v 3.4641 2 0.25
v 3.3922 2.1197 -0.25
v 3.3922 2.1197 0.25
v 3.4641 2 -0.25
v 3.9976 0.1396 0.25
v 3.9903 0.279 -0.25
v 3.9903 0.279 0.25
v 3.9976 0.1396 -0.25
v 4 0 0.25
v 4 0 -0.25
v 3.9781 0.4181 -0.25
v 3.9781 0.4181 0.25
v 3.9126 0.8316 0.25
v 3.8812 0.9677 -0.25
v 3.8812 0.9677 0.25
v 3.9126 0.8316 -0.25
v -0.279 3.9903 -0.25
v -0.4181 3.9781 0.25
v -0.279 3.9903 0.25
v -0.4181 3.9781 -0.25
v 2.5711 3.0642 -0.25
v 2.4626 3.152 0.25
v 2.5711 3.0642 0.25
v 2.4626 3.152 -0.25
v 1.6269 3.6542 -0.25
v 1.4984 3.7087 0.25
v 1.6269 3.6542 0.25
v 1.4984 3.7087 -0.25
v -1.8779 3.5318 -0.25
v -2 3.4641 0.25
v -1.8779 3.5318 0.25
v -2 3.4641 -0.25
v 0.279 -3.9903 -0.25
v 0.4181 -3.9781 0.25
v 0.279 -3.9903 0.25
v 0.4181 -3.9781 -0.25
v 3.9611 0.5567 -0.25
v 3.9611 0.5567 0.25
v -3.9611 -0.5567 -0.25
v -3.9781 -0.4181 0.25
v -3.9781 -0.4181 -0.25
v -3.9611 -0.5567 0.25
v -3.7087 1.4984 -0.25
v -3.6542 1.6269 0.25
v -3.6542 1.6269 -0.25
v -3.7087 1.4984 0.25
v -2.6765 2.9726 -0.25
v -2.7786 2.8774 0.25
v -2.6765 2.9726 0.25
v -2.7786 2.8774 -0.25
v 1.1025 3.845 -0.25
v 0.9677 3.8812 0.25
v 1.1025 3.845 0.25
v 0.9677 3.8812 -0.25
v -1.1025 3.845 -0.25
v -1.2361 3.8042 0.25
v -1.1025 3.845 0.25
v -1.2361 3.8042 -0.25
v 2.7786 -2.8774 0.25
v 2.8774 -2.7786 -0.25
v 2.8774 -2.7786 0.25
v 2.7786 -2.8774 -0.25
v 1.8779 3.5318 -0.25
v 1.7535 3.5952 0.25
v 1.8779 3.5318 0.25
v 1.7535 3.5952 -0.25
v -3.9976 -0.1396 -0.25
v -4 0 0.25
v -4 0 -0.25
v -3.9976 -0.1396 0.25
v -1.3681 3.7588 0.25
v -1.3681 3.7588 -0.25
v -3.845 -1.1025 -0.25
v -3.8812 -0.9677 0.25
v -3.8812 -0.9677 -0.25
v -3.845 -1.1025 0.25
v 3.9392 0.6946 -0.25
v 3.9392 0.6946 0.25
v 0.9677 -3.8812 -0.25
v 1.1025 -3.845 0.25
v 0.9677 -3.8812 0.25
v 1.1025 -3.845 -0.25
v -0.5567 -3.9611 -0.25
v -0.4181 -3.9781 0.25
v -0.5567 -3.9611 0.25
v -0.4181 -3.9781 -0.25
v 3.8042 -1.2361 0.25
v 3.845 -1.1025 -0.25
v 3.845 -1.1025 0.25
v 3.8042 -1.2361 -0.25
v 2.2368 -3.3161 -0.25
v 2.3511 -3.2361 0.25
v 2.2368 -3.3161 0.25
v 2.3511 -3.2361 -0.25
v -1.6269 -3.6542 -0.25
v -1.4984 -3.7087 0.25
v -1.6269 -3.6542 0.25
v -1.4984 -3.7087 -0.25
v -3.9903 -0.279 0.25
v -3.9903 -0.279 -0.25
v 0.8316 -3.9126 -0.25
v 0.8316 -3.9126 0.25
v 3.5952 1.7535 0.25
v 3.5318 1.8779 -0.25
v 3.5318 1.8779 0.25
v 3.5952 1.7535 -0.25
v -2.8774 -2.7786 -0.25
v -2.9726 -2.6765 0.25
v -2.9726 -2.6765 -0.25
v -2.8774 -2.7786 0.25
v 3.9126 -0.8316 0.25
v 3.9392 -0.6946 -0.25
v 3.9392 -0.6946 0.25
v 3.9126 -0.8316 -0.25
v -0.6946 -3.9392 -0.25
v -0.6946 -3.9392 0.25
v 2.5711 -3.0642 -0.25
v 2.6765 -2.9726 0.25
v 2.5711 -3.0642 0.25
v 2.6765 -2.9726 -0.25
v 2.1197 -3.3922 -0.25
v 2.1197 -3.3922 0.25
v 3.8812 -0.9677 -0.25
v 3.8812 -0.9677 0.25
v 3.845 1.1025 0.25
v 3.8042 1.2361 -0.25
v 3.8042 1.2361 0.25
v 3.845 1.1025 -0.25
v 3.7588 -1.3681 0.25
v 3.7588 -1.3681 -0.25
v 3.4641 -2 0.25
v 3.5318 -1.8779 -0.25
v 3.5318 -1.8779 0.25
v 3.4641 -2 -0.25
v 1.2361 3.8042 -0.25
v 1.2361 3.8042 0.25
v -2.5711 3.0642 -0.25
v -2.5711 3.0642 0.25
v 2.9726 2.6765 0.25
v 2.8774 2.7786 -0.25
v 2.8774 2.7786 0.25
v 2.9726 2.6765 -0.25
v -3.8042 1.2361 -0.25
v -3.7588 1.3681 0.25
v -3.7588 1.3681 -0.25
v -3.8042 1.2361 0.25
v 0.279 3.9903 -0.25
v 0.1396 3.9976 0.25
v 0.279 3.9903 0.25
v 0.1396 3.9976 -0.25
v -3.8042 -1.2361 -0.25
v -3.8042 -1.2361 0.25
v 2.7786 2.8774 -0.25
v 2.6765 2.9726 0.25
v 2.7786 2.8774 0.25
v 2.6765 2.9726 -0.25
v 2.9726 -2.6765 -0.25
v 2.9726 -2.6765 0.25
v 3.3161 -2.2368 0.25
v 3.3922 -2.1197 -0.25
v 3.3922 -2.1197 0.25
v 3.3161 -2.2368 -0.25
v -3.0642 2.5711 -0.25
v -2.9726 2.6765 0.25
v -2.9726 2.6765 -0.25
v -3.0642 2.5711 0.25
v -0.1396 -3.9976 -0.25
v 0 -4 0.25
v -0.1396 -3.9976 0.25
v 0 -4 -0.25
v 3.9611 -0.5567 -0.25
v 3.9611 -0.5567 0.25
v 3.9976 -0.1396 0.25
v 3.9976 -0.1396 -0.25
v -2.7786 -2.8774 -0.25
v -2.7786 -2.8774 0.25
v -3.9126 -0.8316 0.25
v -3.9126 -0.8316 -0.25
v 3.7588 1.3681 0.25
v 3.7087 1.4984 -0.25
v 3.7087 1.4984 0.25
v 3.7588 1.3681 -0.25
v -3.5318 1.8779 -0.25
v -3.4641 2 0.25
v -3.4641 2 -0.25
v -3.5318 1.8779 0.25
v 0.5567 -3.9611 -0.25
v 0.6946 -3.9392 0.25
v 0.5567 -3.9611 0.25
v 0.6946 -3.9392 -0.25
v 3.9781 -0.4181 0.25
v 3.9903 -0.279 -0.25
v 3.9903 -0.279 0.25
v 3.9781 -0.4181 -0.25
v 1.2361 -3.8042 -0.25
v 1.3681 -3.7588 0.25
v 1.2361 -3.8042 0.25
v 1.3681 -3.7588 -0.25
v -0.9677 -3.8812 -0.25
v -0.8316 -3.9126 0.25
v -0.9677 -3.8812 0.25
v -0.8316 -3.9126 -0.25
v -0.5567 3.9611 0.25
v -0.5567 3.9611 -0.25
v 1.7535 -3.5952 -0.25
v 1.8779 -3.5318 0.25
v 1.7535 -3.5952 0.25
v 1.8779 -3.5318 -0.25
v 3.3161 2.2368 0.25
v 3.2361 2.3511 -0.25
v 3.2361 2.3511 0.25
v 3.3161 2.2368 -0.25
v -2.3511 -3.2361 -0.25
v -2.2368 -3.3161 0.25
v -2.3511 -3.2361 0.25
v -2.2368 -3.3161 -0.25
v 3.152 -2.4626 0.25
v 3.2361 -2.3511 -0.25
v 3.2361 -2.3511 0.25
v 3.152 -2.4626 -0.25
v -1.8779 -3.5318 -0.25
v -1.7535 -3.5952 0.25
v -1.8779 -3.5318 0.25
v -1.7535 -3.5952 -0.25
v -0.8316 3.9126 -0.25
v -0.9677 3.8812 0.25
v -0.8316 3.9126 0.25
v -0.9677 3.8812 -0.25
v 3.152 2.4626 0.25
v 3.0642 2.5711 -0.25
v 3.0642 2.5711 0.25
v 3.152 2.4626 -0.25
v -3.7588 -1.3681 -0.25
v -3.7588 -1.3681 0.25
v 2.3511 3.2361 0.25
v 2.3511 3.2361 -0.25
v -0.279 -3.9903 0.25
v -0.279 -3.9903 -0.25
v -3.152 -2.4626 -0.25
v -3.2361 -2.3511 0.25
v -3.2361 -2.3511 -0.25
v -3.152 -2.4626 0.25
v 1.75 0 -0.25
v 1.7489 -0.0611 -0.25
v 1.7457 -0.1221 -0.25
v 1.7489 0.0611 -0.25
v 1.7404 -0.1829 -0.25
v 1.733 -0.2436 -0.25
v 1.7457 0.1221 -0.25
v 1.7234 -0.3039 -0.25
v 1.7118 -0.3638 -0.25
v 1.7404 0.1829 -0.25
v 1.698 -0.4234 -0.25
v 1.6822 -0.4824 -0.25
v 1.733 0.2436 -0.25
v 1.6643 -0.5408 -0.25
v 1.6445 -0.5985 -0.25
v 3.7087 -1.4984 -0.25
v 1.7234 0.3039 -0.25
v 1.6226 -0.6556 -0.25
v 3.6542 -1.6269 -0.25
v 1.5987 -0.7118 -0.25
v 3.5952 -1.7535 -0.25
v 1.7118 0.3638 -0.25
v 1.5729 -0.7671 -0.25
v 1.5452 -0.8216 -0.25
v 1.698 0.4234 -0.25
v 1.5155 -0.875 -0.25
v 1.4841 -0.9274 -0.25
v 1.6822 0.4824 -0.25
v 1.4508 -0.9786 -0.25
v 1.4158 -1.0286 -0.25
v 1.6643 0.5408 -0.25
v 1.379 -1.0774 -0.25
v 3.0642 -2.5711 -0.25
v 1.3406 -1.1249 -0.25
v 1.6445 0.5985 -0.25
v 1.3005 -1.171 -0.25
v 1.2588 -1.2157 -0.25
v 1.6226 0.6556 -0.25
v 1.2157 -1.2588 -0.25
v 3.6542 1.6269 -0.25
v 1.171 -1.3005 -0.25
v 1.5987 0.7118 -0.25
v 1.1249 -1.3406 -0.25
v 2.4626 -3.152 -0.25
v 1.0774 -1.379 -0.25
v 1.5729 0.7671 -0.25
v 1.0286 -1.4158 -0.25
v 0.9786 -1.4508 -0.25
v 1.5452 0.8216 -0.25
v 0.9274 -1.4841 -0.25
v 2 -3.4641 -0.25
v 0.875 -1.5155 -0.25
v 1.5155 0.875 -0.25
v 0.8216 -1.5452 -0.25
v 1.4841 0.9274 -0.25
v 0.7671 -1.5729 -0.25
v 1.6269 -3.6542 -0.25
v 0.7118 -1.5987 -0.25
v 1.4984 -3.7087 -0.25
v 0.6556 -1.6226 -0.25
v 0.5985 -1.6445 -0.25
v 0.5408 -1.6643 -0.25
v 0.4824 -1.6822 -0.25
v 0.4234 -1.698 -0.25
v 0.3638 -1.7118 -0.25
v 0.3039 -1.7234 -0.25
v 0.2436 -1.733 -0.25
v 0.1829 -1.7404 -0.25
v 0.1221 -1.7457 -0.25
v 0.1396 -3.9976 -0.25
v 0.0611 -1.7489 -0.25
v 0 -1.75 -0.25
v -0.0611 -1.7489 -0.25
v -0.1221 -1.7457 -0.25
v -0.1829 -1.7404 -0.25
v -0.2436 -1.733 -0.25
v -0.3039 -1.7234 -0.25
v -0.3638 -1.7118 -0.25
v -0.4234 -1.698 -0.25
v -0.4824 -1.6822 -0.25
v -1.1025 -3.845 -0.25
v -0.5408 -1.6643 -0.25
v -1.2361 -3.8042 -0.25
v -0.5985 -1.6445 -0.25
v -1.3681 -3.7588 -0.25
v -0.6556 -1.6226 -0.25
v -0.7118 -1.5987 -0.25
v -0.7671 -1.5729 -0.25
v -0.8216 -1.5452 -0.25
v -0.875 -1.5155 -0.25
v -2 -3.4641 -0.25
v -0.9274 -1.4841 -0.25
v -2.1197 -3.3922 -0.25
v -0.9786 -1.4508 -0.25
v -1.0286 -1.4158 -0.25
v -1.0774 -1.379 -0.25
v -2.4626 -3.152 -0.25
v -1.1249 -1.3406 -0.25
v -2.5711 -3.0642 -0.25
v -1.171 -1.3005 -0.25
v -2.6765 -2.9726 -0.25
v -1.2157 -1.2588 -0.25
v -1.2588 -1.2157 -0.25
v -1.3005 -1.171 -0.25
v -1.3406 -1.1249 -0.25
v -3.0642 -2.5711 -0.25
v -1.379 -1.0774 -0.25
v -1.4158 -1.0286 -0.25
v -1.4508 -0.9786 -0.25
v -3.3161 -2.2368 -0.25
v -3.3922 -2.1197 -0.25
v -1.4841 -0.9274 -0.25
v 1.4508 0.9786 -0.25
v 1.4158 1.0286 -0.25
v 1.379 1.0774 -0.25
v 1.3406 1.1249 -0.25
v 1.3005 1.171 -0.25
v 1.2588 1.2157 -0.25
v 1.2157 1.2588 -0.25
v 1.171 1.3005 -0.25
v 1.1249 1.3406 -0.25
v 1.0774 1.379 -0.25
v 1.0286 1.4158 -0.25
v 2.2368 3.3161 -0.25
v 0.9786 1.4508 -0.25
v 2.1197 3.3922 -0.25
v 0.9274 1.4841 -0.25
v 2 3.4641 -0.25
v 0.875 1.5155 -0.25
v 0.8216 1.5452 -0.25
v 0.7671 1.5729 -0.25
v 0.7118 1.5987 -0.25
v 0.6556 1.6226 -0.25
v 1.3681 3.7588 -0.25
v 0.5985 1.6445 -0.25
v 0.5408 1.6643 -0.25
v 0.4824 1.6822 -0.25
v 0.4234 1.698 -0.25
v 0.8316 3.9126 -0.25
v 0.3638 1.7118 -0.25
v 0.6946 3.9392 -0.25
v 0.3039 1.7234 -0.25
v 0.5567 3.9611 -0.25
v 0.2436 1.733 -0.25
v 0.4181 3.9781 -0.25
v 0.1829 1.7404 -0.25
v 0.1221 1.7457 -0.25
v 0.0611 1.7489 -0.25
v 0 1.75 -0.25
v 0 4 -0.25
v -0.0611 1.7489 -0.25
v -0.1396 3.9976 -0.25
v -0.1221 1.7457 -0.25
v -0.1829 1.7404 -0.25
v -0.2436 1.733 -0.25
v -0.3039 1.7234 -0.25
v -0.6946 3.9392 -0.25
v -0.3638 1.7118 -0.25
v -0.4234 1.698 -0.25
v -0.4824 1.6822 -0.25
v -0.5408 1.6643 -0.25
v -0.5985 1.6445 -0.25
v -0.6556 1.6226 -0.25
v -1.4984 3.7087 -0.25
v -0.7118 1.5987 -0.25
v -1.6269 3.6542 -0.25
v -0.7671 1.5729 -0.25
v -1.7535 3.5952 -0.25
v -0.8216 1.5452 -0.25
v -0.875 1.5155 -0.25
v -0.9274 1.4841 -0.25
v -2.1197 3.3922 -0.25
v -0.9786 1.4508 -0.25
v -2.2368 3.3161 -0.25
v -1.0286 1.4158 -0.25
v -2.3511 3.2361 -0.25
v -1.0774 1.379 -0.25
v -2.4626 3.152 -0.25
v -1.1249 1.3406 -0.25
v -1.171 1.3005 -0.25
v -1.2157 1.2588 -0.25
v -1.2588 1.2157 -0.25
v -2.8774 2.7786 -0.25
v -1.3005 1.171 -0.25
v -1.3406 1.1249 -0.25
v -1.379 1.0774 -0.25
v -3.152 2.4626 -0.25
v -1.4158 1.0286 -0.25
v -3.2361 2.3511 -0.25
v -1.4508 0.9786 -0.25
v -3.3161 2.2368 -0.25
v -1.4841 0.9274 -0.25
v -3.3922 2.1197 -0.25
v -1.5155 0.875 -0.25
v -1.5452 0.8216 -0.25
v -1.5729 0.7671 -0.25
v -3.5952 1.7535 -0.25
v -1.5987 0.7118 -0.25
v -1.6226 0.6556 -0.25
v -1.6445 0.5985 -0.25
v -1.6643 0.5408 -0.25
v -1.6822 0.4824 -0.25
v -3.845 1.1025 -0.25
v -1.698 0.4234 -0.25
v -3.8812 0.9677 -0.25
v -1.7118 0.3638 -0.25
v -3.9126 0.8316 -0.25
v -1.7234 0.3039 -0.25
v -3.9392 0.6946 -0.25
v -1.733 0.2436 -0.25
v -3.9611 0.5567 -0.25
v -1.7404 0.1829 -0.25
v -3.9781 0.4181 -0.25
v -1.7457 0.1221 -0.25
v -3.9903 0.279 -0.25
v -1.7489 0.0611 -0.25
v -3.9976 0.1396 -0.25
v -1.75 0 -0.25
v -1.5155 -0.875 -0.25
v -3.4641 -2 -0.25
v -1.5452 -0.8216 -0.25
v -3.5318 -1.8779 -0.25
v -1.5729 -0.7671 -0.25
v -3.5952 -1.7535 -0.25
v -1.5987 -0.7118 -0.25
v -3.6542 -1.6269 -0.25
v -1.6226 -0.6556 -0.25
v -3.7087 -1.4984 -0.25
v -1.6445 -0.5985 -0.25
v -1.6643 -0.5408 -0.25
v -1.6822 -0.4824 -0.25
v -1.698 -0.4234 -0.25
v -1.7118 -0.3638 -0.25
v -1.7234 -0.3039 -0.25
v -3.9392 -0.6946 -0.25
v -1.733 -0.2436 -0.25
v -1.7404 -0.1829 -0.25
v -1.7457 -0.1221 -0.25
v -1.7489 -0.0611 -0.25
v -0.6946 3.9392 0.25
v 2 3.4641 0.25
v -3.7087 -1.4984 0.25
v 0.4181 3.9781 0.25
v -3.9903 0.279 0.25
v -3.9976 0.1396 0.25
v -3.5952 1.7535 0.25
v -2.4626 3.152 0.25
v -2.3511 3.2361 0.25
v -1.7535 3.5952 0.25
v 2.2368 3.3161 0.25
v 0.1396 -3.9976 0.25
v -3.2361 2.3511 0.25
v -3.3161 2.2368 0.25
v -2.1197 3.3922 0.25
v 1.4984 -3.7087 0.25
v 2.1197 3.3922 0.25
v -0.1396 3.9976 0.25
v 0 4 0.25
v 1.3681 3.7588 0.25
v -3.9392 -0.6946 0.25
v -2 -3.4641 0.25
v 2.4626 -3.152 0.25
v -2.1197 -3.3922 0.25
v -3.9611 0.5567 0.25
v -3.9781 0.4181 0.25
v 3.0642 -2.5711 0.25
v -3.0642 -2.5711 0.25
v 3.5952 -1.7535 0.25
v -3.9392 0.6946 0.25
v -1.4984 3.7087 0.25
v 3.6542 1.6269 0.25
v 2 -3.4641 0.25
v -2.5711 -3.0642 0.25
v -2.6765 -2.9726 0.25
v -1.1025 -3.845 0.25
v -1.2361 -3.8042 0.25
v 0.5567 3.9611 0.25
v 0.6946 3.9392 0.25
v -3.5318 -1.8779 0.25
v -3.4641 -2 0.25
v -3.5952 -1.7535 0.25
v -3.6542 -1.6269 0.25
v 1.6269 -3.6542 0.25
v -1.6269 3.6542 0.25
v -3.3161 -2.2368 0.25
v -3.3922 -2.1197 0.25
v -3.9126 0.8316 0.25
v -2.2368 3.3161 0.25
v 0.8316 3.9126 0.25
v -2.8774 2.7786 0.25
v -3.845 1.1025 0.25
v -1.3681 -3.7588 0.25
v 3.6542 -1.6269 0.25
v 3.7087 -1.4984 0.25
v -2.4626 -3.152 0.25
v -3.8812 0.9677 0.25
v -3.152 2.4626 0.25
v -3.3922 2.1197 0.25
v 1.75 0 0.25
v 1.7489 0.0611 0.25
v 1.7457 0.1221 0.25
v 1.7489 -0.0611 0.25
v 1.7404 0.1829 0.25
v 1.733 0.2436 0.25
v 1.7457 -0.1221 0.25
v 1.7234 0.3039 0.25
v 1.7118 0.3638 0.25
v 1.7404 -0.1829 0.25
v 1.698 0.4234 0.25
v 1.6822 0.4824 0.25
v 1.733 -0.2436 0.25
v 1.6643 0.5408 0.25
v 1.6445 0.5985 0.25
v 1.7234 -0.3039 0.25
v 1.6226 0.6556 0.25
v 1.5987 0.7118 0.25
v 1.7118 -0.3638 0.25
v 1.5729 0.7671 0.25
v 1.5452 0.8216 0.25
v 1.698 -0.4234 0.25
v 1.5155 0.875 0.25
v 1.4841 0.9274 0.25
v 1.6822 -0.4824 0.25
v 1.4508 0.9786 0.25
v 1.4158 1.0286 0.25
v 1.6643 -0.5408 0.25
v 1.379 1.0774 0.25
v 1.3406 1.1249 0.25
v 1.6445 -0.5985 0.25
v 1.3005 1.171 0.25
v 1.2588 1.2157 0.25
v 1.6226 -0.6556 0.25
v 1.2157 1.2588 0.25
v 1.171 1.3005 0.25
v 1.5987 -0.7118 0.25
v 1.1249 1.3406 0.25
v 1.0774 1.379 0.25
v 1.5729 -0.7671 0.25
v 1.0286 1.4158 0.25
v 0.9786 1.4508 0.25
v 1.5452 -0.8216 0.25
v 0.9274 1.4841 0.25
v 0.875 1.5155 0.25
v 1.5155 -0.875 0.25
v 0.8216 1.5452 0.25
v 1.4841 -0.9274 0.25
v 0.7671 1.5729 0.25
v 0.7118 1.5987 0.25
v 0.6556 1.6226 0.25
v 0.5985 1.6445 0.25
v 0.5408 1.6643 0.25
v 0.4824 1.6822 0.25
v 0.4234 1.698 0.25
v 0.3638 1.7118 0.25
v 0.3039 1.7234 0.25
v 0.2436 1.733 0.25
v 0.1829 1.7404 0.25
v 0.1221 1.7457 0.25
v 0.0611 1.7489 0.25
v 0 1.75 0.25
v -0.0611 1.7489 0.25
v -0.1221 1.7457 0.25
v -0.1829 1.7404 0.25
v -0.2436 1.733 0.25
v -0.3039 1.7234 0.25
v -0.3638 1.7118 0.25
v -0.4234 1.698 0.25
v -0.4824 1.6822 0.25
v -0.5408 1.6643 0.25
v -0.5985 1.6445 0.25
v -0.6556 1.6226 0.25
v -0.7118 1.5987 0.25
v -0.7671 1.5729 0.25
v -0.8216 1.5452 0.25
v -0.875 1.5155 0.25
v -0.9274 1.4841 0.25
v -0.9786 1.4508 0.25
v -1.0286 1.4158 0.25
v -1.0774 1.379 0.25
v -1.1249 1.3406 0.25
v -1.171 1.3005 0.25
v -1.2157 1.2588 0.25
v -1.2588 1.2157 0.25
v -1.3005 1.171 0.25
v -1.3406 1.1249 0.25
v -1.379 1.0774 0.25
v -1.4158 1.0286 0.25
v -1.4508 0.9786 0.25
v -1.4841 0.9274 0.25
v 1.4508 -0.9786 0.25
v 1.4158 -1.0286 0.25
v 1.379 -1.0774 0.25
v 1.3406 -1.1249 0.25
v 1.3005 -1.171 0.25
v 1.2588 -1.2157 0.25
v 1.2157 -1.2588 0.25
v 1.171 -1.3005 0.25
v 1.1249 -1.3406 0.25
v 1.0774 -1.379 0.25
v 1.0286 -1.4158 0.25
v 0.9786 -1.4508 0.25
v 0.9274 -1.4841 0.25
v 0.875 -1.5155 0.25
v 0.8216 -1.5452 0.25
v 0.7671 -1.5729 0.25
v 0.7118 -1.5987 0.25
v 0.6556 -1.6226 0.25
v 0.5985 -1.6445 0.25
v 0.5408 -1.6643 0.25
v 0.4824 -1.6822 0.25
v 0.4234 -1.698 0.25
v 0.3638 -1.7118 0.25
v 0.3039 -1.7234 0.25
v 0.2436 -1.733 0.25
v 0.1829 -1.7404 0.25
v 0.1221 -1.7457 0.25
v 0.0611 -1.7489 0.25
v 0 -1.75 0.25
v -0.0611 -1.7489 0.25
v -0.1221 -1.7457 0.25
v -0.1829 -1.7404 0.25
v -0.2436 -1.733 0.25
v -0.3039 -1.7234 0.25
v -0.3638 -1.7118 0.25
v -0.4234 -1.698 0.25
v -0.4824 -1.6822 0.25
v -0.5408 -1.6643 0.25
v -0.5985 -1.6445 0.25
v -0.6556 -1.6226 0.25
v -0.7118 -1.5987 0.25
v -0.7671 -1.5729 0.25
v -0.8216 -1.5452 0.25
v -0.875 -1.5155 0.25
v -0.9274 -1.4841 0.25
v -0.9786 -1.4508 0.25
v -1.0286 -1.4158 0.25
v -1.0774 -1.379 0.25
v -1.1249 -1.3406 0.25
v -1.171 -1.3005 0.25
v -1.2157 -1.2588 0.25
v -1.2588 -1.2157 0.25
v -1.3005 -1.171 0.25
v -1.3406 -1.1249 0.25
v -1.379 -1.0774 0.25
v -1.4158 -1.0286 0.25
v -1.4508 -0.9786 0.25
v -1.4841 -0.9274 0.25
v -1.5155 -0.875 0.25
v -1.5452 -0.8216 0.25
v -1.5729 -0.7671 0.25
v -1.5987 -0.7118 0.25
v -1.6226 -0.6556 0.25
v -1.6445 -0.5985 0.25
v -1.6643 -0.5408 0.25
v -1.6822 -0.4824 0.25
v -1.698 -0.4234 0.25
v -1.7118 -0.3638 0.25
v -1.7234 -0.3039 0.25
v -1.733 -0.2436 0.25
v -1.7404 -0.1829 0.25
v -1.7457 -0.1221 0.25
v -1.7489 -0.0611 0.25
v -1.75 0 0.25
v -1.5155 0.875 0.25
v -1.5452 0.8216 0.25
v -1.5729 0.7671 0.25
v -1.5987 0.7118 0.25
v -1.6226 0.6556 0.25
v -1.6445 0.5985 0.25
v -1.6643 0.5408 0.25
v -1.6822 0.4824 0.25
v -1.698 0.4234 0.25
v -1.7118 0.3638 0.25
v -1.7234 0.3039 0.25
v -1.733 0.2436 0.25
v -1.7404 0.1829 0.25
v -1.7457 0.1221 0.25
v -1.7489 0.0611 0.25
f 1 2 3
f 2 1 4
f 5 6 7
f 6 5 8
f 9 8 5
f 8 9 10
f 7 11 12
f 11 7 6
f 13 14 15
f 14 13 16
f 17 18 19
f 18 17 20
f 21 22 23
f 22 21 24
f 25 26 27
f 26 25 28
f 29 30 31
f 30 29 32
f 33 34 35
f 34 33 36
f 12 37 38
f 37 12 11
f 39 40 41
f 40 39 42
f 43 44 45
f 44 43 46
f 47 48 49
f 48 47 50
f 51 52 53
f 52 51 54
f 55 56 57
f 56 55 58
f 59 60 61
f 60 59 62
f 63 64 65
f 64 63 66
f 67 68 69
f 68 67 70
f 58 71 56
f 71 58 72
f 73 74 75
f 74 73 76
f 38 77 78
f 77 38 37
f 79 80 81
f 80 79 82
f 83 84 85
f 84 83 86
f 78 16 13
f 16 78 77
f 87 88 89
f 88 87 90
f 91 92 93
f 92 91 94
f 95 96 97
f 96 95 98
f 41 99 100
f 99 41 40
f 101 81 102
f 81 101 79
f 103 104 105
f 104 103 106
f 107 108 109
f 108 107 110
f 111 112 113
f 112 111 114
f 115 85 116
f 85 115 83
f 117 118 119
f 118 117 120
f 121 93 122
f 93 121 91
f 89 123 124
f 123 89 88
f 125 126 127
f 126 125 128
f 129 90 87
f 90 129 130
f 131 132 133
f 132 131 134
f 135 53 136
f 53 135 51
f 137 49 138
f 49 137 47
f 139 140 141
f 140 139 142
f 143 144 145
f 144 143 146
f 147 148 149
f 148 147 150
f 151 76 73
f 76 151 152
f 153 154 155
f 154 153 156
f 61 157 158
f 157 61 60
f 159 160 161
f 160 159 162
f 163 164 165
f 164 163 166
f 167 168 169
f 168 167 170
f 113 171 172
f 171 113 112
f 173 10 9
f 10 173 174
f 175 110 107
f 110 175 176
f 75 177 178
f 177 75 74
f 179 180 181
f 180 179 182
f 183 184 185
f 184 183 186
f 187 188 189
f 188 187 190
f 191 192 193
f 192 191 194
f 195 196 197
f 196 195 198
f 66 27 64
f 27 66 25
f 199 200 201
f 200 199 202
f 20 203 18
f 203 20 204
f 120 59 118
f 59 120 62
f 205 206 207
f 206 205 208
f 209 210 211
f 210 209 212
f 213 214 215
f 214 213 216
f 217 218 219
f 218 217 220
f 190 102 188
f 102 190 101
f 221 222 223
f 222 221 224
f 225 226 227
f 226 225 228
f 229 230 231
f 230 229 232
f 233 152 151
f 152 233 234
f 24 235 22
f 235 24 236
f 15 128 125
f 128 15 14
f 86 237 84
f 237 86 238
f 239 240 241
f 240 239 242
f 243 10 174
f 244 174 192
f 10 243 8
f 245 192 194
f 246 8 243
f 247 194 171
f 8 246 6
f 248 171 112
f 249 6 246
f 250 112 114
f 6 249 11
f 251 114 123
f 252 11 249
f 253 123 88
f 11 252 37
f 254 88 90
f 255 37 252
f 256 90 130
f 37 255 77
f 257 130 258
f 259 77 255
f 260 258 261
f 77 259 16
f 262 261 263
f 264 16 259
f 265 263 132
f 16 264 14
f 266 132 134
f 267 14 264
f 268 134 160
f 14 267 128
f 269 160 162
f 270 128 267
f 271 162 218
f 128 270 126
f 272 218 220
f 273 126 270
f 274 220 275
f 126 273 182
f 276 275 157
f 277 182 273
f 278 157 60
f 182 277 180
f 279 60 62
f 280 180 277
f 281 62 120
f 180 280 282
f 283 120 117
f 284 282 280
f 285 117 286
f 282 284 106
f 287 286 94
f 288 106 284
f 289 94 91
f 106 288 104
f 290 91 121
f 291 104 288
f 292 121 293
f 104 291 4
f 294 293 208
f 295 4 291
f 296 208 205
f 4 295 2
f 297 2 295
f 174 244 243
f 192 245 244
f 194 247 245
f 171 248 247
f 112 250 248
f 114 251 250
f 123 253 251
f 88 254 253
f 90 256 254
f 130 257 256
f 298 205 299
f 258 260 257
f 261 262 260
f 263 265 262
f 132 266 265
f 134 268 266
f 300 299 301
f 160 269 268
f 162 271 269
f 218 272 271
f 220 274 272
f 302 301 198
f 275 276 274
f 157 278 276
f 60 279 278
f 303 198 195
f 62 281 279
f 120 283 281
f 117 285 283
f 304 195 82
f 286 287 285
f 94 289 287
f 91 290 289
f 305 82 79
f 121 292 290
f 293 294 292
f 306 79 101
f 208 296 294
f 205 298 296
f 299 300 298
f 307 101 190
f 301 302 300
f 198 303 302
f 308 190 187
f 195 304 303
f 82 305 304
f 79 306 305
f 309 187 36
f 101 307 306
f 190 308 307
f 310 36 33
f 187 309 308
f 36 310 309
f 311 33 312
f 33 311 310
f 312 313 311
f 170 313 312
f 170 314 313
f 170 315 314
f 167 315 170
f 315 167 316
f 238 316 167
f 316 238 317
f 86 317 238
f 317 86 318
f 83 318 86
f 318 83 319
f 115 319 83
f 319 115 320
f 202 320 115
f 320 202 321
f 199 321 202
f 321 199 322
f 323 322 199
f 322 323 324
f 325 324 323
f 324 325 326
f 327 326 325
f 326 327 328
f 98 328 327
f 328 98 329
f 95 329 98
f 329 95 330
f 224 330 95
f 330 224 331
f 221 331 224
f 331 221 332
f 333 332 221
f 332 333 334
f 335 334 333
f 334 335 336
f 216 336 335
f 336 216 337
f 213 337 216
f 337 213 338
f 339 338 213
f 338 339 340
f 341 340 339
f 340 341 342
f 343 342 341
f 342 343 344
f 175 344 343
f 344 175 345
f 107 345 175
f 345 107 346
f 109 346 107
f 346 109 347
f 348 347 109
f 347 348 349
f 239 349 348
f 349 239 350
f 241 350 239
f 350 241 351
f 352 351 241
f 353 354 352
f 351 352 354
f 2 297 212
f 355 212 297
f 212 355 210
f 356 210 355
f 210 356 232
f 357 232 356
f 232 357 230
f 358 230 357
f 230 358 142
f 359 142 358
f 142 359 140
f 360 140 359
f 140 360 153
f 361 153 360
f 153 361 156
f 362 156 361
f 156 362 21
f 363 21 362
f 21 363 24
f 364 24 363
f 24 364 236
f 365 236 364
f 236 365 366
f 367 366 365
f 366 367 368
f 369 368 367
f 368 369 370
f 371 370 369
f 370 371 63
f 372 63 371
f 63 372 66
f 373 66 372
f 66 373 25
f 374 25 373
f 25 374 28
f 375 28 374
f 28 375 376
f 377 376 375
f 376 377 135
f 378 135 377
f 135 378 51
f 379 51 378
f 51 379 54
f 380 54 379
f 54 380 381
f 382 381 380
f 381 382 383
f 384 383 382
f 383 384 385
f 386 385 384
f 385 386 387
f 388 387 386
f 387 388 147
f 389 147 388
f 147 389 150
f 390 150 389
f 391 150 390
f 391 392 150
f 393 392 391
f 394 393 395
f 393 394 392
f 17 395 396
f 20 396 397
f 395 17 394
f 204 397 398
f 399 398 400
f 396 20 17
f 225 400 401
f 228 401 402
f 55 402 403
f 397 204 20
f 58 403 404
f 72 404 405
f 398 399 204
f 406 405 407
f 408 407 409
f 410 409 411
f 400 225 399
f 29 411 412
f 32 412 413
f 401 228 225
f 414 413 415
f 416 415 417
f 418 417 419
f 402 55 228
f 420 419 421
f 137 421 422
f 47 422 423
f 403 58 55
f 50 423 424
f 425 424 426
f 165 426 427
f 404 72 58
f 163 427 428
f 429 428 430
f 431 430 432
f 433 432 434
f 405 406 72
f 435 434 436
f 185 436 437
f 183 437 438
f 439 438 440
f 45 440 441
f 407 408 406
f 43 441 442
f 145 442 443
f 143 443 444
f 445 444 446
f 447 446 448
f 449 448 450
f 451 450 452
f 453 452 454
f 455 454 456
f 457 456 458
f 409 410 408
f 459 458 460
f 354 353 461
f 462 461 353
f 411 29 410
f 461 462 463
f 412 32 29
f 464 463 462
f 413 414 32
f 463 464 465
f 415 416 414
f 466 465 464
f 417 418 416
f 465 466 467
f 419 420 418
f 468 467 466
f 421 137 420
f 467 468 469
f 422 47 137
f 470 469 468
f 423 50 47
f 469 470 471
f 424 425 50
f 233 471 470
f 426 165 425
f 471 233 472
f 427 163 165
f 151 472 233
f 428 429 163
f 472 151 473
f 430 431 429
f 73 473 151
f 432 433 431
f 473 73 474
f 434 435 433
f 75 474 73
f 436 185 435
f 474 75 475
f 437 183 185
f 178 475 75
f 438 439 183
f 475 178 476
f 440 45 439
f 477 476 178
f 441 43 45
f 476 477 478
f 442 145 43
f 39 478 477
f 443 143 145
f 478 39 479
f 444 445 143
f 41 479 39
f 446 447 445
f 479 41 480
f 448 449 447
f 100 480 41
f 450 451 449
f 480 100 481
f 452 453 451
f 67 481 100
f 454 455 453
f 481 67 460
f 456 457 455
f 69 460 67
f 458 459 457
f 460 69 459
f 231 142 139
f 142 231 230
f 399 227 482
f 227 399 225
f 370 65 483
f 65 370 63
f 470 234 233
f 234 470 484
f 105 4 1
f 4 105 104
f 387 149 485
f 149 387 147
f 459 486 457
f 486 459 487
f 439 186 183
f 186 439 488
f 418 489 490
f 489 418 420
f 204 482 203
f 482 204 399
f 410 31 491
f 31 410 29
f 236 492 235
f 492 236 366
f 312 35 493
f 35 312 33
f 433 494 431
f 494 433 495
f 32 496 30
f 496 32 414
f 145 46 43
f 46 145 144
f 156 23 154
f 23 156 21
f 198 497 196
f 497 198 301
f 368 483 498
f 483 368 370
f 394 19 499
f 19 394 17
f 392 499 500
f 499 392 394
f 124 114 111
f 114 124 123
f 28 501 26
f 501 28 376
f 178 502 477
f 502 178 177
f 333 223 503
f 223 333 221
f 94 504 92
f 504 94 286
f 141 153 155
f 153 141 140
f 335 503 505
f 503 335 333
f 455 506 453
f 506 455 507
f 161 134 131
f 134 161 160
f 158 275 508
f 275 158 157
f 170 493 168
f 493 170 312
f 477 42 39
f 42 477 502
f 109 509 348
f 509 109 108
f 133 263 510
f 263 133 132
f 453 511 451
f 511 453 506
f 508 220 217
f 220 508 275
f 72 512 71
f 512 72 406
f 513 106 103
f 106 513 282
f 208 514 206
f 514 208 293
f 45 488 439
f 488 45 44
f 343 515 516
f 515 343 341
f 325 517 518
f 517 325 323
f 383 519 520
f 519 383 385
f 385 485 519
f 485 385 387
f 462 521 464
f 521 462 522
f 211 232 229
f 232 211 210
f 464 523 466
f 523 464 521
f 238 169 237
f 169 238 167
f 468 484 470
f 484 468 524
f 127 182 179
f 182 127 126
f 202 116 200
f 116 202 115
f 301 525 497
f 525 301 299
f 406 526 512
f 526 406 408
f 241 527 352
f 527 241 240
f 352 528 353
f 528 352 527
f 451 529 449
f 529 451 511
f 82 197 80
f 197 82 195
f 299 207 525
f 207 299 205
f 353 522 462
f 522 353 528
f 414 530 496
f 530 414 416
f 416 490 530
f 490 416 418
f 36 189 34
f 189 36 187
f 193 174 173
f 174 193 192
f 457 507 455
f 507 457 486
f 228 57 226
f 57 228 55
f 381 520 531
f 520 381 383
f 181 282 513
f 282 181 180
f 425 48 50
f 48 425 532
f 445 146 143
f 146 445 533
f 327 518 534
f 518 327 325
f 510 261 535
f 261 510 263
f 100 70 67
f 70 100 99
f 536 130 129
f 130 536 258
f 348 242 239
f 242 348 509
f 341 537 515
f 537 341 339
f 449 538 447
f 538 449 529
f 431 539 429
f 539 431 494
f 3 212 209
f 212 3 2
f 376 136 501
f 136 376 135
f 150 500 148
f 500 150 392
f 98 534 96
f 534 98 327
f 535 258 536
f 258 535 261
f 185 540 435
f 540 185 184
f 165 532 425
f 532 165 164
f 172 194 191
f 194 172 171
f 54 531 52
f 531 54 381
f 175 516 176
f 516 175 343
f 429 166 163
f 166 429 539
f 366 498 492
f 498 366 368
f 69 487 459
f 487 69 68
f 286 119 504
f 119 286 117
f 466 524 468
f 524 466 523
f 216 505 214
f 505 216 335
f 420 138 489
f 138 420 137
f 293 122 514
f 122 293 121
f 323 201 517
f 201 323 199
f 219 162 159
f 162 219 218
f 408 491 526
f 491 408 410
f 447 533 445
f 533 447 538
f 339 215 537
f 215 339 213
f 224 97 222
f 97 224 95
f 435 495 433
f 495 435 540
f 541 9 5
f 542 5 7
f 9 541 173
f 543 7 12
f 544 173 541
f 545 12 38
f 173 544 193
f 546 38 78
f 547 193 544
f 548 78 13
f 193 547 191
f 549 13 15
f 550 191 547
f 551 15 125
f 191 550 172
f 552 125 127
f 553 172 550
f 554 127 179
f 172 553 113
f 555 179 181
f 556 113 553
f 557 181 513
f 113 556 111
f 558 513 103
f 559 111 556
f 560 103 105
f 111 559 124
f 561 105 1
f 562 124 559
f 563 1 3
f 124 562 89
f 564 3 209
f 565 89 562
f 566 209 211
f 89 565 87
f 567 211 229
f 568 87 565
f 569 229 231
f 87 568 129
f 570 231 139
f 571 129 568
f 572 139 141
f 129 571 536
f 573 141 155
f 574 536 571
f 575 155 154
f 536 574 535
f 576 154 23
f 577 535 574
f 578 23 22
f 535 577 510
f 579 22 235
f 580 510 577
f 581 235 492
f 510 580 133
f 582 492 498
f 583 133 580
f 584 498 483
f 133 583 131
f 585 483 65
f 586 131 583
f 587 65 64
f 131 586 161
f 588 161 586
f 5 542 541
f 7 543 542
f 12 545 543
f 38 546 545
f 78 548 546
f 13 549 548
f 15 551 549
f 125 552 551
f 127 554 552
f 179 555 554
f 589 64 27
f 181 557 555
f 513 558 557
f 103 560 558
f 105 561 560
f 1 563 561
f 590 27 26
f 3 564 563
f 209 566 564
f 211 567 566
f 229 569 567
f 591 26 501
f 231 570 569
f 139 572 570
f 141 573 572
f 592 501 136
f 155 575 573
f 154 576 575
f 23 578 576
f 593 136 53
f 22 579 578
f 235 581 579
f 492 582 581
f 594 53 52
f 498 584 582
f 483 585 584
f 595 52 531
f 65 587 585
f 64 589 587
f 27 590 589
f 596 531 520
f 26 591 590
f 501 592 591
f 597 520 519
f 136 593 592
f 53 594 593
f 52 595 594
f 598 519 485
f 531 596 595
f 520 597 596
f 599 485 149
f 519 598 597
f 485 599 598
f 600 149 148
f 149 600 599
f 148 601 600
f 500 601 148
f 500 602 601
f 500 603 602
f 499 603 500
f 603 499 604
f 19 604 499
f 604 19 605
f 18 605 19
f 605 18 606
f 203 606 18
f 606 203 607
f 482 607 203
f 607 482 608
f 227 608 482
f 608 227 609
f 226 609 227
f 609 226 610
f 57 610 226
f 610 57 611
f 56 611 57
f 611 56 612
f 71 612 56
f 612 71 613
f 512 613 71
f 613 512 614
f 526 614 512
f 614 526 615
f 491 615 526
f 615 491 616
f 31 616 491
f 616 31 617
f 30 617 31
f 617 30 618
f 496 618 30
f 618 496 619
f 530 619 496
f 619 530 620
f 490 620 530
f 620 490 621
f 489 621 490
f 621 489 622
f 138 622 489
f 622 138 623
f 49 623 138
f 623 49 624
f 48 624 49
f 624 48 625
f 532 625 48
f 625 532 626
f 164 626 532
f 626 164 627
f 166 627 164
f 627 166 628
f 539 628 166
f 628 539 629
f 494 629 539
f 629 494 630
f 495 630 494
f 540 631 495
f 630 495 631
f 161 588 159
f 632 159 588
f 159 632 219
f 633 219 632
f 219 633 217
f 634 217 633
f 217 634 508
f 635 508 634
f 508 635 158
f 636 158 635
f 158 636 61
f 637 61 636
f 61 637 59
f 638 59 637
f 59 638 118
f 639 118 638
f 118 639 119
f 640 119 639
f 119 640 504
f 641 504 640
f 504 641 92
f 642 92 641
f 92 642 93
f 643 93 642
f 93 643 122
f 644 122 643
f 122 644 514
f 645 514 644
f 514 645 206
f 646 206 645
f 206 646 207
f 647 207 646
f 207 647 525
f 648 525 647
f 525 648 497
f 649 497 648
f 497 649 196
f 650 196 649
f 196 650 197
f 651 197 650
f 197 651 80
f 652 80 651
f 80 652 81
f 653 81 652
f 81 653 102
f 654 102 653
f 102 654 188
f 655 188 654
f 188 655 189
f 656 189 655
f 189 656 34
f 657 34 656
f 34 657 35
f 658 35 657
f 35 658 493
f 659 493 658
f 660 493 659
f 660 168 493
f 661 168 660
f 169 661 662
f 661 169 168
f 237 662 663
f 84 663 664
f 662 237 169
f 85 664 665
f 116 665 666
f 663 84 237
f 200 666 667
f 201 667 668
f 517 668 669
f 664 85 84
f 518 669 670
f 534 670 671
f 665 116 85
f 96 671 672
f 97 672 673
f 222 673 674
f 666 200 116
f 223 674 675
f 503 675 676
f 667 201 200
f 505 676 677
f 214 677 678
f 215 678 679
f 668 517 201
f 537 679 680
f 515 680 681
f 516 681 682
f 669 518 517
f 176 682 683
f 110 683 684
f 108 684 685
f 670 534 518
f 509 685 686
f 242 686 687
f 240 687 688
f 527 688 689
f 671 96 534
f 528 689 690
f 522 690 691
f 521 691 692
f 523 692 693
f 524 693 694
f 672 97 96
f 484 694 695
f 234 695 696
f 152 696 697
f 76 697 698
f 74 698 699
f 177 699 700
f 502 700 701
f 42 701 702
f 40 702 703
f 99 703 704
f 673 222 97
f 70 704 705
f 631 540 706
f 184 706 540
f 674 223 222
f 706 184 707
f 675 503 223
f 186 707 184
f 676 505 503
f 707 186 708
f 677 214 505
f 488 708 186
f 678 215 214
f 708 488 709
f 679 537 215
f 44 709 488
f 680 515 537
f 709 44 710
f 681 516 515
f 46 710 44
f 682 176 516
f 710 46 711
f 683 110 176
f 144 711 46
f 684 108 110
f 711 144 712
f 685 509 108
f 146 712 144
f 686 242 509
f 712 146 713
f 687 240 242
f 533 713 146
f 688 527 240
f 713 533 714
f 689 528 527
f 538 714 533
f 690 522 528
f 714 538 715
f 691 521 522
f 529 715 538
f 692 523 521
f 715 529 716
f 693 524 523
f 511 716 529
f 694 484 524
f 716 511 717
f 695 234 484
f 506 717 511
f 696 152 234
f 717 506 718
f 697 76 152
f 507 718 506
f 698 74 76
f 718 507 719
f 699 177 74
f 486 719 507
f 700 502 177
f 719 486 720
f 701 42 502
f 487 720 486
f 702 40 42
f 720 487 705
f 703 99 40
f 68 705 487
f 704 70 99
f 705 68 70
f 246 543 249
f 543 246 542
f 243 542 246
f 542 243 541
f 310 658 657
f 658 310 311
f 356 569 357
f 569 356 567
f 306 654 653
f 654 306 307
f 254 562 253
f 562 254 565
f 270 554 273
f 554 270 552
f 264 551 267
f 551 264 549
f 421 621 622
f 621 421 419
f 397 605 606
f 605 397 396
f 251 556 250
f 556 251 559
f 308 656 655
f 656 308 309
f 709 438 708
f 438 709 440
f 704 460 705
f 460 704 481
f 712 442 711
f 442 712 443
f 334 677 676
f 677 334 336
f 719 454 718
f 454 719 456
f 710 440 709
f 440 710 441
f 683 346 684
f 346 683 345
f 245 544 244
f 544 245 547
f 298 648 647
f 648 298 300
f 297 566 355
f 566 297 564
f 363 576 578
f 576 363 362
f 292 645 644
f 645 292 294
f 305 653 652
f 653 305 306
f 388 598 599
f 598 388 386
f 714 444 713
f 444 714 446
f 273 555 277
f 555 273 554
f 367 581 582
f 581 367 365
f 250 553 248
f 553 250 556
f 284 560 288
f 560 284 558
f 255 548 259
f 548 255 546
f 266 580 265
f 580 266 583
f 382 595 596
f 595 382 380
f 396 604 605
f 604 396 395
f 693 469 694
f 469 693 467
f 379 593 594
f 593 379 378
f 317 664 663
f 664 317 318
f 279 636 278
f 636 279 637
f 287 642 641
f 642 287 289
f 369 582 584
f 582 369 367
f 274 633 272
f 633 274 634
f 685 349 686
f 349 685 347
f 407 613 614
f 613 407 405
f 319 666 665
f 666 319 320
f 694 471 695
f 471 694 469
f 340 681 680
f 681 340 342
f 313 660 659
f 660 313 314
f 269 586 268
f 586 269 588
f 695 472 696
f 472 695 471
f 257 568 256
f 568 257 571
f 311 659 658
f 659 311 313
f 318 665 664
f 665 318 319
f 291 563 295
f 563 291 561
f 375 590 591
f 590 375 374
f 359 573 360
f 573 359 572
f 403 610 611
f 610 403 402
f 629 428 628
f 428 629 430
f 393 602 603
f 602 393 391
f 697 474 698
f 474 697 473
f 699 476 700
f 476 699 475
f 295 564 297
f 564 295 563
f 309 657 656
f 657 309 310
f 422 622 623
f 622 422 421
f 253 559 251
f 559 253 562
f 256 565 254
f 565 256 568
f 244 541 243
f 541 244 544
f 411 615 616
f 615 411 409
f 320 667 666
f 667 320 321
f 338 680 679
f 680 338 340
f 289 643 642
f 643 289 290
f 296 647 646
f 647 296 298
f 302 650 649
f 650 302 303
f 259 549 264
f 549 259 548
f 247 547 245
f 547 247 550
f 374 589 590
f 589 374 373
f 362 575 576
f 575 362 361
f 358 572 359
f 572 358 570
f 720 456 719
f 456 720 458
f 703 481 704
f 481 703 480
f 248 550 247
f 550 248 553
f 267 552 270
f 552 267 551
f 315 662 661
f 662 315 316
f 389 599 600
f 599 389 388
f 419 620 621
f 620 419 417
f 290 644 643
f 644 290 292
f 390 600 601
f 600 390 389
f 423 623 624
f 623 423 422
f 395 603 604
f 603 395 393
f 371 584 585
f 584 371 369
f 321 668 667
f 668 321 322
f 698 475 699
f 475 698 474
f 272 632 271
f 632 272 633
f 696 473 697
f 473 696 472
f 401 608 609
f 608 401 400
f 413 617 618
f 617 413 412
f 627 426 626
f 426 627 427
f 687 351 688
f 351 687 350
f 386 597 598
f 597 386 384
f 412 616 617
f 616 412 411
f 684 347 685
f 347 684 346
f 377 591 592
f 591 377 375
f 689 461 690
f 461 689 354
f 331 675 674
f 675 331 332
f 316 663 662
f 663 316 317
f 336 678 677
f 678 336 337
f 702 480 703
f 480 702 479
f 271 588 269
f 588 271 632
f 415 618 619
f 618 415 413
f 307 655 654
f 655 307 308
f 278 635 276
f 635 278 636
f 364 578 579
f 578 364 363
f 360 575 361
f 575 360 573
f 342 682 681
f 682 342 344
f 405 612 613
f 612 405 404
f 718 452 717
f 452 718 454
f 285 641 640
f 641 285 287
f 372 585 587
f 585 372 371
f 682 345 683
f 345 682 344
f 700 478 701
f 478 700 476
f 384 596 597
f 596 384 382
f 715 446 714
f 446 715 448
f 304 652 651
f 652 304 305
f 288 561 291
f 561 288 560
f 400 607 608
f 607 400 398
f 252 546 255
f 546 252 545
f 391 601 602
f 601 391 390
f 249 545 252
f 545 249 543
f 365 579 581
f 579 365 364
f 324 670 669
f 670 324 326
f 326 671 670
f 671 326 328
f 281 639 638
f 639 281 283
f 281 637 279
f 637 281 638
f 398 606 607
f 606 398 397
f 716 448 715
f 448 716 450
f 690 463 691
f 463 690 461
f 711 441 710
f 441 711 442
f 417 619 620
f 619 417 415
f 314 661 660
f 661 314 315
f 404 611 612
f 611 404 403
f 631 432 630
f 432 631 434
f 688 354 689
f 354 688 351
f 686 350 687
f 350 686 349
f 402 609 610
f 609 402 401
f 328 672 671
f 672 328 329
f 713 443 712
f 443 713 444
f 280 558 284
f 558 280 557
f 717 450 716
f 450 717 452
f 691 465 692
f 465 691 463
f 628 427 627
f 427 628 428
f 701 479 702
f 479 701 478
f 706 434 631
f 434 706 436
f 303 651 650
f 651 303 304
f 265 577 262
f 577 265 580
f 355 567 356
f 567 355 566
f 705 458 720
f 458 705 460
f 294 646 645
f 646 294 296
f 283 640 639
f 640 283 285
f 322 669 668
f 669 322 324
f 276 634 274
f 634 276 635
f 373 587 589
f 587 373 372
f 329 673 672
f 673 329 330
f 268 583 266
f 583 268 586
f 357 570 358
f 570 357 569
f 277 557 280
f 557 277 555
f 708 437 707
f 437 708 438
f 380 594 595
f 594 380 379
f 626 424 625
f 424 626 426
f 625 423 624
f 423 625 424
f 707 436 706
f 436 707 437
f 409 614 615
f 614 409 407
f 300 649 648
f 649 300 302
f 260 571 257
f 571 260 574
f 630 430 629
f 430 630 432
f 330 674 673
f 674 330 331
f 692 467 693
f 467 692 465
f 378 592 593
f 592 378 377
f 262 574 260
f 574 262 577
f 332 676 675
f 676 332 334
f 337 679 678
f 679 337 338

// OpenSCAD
$fn = 180;

module washer_ring_body(id=3.5, od=8.0, t=0.5) {
    difference() {
        cylinder(h=t, d=od, center=true);
        cylinder(h=t + 0.2, d=id, center=true);
    }
}

washer_ring_body();
